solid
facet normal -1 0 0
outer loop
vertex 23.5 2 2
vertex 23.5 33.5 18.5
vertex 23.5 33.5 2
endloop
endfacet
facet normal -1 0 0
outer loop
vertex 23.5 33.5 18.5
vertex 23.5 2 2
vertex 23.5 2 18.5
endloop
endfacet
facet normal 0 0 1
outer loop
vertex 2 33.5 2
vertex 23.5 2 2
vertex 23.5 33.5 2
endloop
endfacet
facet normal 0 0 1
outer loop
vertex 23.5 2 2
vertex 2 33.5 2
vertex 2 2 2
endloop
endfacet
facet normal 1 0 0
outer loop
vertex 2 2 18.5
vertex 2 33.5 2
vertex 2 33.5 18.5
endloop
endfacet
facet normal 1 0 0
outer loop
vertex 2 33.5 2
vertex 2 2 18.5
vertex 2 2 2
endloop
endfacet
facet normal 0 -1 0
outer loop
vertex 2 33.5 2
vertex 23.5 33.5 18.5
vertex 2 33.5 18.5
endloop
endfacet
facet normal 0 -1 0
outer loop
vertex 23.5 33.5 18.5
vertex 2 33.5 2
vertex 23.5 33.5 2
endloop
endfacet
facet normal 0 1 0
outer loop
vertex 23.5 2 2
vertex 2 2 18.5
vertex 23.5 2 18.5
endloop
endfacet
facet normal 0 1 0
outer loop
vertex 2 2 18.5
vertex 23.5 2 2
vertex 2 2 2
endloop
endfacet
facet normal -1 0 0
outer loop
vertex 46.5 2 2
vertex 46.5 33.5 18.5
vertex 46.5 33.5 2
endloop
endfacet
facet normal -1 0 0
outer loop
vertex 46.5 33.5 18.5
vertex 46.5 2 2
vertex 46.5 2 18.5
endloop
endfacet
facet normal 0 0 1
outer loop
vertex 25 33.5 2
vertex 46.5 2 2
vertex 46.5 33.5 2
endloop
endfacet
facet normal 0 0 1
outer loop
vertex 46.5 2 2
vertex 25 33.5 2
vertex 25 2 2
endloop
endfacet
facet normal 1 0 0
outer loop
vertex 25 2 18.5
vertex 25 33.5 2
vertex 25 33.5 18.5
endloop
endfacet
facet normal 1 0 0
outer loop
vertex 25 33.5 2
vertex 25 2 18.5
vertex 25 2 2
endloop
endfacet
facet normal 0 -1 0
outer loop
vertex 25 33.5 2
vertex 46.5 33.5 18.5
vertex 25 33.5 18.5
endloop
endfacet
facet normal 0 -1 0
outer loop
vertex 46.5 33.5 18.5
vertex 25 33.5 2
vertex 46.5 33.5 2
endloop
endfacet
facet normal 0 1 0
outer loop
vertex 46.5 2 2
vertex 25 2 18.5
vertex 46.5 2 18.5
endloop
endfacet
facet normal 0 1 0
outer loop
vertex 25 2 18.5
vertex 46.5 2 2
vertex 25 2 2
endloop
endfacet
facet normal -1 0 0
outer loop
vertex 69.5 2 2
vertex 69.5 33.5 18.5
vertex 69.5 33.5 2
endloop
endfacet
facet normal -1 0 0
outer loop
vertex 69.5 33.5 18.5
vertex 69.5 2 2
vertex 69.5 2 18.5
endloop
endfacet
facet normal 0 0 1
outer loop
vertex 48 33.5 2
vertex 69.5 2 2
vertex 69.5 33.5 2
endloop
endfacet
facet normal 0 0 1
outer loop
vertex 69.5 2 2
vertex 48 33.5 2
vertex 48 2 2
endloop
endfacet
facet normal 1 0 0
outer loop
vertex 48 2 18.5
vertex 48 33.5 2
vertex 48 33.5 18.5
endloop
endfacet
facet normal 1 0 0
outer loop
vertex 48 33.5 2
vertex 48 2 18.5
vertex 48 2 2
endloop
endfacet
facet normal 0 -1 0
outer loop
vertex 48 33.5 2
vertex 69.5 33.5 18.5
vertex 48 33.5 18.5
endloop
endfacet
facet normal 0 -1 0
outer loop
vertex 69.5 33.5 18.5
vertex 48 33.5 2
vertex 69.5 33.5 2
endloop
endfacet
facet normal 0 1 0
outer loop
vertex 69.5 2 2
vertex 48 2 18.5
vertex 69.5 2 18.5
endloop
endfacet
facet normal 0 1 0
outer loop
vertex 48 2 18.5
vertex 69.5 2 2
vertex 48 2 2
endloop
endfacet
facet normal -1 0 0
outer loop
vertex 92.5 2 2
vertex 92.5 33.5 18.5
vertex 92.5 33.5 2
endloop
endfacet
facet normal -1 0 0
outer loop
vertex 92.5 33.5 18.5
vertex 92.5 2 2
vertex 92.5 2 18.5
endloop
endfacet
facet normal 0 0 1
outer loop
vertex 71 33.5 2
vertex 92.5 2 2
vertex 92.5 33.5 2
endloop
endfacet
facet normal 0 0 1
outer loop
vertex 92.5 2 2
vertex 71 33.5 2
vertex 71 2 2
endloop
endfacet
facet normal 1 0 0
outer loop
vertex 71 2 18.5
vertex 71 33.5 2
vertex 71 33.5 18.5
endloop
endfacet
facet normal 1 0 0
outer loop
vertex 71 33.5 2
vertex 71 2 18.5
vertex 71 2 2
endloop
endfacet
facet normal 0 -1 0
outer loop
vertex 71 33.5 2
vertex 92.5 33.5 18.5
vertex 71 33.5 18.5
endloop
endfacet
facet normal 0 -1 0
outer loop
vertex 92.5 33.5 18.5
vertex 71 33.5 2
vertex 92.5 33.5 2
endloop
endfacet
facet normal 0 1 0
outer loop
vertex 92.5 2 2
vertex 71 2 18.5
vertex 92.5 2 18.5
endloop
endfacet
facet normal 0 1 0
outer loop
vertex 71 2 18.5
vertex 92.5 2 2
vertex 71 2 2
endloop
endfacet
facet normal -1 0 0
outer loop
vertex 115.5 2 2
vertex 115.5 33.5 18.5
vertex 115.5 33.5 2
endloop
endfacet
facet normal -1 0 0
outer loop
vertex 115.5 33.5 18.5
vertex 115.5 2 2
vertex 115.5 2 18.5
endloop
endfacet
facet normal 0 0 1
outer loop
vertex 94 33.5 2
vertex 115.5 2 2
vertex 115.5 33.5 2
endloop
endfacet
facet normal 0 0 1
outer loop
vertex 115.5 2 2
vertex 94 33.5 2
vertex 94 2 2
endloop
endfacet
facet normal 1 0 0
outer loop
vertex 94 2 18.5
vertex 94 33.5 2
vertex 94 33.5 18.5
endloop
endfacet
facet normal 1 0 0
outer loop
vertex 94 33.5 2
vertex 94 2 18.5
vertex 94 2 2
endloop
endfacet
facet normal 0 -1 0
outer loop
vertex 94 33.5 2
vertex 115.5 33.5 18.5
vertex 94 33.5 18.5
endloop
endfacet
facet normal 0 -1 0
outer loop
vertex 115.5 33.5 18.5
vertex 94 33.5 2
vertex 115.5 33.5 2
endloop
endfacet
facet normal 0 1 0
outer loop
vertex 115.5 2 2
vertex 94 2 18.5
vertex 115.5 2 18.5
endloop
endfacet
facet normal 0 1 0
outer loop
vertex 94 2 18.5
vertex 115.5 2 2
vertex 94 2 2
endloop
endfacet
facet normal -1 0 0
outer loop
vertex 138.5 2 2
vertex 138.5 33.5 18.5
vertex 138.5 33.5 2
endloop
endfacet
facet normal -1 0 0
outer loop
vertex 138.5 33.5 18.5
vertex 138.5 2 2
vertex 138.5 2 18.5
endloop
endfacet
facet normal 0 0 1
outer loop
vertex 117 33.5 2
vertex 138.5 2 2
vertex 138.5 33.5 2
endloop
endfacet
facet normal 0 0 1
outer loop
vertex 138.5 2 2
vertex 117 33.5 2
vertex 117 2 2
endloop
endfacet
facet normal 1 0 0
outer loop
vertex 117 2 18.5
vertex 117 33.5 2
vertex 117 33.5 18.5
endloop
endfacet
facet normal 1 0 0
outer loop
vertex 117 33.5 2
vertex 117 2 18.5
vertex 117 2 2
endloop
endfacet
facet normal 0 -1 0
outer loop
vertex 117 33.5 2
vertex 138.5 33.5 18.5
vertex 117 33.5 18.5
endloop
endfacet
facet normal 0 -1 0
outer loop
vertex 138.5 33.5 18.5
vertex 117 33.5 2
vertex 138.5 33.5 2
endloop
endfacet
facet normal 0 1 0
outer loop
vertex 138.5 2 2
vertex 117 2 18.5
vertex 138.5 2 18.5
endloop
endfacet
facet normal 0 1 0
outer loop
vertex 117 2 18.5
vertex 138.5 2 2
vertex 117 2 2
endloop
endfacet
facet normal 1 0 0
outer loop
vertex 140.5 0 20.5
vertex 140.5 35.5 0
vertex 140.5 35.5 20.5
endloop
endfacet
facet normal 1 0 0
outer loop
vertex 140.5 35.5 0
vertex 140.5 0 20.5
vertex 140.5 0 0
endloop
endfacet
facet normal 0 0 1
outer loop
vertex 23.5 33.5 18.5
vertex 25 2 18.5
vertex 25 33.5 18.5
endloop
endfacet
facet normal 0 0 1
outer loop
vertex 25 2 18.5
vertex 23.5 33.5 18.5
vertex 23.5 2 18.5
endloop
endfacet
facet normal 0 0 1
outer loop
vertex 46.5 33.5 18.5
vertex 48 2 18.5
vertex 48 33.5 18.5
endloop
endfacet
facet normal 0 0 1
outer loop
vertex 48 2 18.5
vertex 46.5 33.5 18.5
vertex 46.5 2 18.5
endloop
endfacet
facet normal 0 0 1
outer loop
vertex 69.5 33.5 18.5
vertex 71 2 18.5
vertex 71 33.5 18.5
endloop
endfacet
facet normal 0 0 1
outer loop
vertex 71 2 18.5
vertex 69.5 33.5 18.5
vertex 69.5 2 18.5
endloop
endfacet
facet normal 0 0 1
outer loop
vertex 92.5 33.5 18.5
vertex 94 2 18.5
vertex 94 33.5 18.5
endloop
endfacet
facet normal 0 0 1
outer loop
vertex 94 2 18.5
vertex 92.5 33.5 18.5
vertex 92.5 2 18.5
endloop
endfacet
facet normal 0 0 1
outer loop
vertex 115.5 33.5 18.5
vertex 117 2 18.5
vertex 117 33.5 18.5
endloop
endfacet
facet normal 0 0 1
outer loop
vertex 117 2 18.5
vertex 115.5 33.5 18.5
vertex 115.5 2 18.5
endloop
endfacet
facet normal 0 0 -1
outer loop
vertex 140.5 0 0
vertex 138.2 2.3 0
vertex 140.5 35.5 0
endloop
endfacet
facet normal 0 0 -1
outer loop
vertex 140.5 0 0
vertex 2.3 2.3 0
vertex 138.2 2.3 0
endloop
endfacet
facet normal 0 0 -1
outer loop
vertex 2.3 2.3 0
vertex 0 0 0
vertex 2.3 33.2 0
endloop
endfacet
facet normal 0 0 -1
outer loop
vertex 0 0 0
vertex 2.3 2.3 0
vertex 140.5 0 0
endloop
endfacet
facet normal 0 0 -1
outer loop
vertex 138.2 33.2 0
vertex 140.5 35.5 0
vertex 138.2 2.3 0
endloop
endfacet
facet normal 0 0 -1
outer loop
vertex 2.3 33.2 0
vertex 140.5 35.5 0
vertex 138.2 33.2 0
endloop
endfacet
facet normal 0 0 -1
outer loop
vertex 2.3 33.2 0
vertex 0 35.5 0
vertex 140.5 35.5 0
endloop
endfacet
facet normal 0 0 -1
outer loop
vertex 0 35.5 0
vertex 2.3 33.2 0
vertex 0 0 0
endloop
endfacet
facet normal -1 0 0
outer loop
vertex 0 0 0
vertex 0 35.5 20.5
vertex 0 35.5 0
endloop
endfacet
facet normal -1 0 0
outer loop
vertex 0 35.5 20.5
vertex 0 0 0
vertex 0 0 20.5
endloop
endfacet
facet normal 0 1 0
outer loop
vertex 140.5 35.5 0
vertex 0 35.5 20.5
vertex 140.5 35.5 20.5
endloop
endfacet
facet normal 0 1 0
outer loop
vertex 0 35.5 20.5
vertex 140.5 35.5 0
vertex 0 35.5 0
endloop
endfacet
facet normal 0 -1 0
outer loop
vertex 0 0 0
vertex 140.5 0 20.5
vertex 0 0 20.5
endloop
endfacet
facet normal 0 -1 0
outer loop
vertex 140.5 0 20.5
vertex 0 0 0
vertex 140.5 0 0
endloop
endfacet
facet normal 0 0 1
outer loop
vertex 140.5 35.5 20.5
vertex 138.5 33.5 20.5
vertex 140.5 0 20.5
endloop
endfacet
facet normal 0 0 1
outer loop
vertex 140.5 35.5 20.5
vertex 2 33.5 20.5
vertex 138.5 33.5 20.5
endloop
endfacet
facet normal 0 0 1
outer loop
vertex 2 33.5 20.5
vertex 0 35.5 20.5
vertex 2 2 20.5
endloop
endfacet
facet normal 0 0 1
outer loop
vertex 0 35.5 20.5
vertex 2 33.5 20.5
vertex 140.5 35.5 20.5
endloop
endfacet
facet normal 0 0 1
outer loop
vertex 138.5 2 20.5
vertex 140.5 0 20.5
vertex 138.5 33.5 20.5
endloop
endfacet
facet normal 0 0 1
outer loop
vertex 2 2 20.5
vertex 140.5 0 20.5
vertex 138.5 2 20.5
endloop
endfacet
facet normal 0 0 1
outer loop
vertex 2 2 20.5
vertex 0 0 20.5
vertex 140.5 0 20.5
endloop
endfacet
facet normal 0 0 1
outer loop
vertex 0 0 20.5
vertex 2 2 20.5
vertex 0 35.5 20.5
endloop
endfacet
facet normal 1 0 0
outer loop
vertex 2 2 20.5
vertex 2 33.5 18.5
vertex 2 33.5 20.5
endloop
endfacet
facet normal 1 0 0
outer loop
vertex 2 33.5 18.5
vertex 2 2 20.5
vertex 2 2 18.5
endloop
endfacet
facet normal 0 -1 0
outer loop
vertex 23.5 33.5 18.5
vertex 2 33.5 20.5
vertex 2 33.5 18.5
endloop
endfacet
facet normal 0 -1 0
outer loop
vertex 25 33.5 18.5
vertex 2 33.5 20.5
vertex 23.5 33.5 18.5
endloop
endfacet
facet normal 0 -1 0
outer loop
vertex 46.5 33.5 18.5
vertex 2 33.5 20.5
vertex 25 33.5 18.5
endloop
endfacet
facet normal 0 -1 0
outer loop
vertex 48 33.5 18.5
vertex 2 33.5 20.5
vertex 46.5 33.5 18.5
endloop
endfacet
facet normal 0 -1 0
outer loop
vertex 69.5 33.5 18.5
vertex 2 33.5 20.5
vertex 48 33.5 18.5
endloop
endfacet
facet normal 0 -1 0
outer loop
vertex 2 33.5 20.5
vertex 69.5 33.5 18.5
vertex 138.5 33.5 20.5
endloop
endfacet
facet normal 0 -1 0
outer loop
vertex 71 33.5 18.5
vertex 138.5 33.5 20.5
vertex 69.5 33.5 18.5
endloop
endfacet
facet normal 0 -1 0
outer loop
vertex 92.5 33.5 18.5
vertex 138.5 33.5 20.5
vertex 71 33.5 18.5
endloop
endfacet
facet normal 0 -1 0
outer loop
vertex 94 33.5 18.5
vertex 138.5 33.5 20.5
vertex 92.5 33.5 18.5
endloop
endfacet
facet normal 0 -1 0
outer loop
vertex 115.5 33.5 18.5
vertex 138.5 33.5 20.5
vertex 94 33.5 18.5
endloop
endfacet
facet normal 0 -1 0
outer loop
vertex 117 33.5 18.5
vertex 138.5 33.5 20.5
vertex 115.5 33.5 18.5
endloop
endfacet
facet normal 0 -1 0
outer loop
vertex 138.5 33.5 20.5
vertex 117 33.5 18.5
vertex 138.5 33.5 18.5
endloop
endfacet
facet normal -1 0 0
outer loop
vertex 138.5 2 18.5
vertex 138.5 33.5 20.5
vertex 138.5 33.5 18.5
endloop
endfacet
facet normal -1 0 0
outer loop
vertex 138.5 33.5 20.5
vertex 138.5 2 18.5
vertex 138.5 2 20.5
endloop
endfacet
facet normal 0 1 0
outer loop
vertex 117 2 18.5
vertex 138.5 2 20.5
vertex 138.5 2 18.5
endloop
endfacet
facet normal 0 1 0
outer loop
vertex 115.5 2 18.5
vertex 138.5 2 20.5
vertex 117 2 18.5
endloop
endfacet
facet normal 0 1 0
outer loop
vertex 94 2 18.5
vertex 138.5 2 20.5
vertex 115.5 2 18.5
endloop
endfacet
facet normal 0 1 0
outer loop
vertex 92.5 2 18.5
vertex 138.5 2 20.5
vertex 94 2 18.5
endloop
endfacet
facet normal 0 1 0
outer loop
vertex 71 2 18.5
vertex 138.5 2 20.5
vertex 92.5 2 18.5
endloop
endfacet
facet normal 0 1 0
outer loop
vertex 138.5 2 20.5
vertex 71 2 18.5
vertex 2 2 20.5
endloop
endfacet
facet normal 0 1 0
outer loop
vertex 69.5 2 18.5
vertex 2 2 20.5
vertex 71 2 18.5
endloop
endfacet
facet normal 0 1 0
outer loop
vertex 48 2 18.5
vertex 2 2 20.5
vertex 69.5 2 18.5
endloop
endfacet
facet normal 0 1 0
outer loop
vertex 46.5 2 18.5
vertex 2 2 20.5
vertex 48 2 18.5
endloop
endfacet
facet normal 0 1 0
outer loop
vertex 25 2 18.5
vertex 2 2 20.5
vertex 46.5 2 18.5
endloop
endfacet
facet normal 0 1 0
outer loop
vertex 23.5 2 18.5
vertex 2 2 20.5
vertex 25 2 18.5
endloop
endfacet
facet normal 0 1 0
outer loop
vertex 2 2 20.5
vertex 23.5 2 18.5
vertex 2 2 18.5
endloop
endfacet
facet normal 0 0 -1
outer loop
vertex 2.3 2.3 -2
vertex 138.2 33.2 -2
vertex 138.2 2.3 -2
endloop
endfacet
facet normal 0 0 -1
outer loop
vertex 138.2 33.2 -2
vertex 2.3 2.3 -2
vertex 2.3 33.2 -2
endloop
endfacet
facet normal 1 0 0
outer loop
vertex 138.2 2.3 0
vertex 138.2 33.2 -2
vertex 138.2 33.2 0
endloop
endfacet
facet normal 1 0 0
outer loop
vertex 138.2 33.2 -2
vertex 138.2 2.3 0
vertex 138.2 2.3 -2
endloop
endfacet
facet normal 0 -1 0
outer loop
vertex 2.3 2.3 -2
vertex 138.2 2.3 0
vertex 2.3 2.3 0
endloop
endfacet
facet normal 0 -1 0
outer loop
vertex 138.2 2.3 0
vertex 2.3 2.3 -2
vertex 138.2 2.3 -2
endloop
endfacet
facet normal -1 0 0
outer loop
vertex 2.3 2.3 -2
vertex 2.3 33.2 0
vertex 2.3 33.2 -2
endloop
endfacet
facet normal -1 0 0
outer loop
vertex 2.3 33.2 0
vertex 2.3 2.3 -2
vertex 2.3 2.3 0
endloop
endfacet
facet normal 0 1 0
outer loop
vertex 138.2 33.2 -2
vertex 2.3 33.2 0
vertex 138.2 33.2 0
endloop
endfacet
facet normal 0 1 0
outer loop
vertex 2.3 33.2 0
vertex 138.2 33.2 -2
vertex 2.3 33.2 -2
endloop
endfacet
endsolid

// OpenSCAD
// Generated by SolidPython 1.1.3 on 2026-02-21 18:44:59


union() {
	union() {
		difference() {
			cube(size = [140.5000000000, 35.5000000000, 18.5000000000]);
			union() {
				translate(v = [2.0000000000, 2.0000000000, 2.0000000000]) {
					cube(size = [21.5000000000, 31.5000000000, 16.5100000000]);
				}
				translate(v = [25.0000000000, 2.0000000000, 2.0000000000]) {
					cube(size = [21.5000000000, 31.5000000000, 16.5100000000]);
				}
				translate(v = [48.0000000000, 2.0000000000, 2.0000000000]) {
					cube(size = [21.5000000000, 31.5000000000, 16.5100000000]);
				}
				translate(v = [71.0000000000, 2.0000000000, 2.0000000000]) {
					cube(size = [21.5000000000, 31.5000000000, 16.5100000000]);
				}
				translate(v = [94.0000000000, 2.0000000000, 2.0000000000]) {
					cube(size = [21.5000000000, 31.5000000000, 16.5100000000]);
				}
				translate(v = [117.0000000000, 2.0000000000, 2.0000000000]) {
					cube(size = [21.5000000000, 31.5000000000, 16.5100000000]);
				}
			}
		}
		translate(v = [0, 0, 18.5000000000]) {
			linear_extrude(height = 2.0000000000) {
				difference() {
					square(size = [140.5000000000, 35.5000000000]);
					offset(r = -2.0000000000) {
						square(size = [140.5000000000, 35.5000000000]);
					}
				}
			}
		}
	}
	translate(v = [0, 0, -2.0000000000]) {
		linear_extrude(height = 2.0000000000) {
			offset(r = -2.3000000000) {
				square(size = [140.5000000000, 35.5000000000]);
			}
		}
	}
}
/***********************************************
*********      SolidPython code:      **********
************************************************
 
"""SolidPython geometry building for storage cases."""

from typing import List, Union

from solid import (
    cube,
    difference,
    linear_extrude,
    offset,
    scad_render_to_file,
    square,
    translate,
    union,
)

from .config import Config
from .layout import GridLayoutResult, MixedLayoutResult, SlotRect


def build_base_tray(
    slots: List[SlotRect],
    total_width: float,
    total_length: float,
    config: Config,
):
    """Build the solid base tray (floor + perimeter walls) with slot cavities subtracted."""
    wall = config.wall_thickness
    base_h = config.base_height
    max_height = max(s.height for s in slots)

    if config.case_size is not None:
        outer_x, outer_y = config.case_size
    outer_z = base_h + max_height
    r = config.corner_radius

    if config.case_size is not None:
        pass  # outer_x, outer_y already set
    else:
        corner_inset = (r + 1.0) if r > 0 else 0
        corner_padding = 2 * corner_inset
        outer_x = total_width + 2 * wall + corner_padding
        outer_y = total_length + 2 * wall + corner_padding

    if r > 0:
        # Round only outer corners in XY plane: 2D offset + linear_extrude
        base_2d = square([outer_x - 2 * r, outer_y - 2 * r])
        rounded_2d = offset(r=r)(base_2d)
        outer_box = linear_extrude(height=outer_z)(rounded_2d)
    else:
        outer_box = cube([outer_x, outer_y, outer_z])

    # Subtract each slot cavity (use uniform depth so all slots are clearly visible)
    # Inset by corner_radius + safety margin so cavities don't cut into rounded corners
    cavity_inset = (r + 1.0) if r > 0 else 0
    cavities = []
    for slot in slots:
        cavity = translate([wall + cavity_inset + slot.x, wall + cavity_inset + slot.y, base_h])(
            cube([slot.width, slot.length, max_height + 0.01])  # +epsilon for clean cut
        )
        cavities.append(cavity)

    if cavities:
        tray = difference()(outer_box, union()(*cavities))
    else:
        tray = outer_box

    if config.stackable:
        lip_inner = config.stack_lip_inner
        lip_height = config.stack_lip_height
        clearance = config.stack_clearance

        # Top lip: extends INWARD from top (original design)
        if r > 0:
            outer_2d = offset(r=r)(square([outer_x - 2 * r, outer_y - 2 * r]))
        else:
            outer_2d = square([outer_x, outer_y])
        inner_2d = offset(r=-lip_inner)(outer_2d)
        lip_ring = difference()(outer_2d, inner_2d)
        lip_3d = translate([0, 0, outer_z])(linear_extrude(height=lip_height)(lip_ring))
        tray = union()(tray, lip_3d)

        # Bottom foot: extends DOWN with shape matching lip opening (negative of lip)
        # Foot fits into the lip opening and sits on the ledge
        foot_2d = offset(r=-(lip_inner + clearance))(outer_2d)
        foot_3d = translate([0, 0, -lip_height])(linear_extrude(height=lip_height)(foot_2d))
        tray = union()(tray, foot_3d)

    return tray


def assemble_case(
    layout_result: Union[GridLayoutResult, MixedLayoutResult],
    config: Config,
):
    """Assemble the complete case: base tray with slot cavities (dividers are implicit)."""
    slots = layout_result.slots
    total_width = layout_result.total_width
    total_length = layout_result.total_length

    case = build_base_tray(slots, total_width, total_length, config)
    return case


def render_to_file(assembly, filepath: str) -> None:
    """Render the assembly to an OpenSCAD .scad file."""
    scad_render_to_file(assembly, filepath)
 
 
************************************************/
